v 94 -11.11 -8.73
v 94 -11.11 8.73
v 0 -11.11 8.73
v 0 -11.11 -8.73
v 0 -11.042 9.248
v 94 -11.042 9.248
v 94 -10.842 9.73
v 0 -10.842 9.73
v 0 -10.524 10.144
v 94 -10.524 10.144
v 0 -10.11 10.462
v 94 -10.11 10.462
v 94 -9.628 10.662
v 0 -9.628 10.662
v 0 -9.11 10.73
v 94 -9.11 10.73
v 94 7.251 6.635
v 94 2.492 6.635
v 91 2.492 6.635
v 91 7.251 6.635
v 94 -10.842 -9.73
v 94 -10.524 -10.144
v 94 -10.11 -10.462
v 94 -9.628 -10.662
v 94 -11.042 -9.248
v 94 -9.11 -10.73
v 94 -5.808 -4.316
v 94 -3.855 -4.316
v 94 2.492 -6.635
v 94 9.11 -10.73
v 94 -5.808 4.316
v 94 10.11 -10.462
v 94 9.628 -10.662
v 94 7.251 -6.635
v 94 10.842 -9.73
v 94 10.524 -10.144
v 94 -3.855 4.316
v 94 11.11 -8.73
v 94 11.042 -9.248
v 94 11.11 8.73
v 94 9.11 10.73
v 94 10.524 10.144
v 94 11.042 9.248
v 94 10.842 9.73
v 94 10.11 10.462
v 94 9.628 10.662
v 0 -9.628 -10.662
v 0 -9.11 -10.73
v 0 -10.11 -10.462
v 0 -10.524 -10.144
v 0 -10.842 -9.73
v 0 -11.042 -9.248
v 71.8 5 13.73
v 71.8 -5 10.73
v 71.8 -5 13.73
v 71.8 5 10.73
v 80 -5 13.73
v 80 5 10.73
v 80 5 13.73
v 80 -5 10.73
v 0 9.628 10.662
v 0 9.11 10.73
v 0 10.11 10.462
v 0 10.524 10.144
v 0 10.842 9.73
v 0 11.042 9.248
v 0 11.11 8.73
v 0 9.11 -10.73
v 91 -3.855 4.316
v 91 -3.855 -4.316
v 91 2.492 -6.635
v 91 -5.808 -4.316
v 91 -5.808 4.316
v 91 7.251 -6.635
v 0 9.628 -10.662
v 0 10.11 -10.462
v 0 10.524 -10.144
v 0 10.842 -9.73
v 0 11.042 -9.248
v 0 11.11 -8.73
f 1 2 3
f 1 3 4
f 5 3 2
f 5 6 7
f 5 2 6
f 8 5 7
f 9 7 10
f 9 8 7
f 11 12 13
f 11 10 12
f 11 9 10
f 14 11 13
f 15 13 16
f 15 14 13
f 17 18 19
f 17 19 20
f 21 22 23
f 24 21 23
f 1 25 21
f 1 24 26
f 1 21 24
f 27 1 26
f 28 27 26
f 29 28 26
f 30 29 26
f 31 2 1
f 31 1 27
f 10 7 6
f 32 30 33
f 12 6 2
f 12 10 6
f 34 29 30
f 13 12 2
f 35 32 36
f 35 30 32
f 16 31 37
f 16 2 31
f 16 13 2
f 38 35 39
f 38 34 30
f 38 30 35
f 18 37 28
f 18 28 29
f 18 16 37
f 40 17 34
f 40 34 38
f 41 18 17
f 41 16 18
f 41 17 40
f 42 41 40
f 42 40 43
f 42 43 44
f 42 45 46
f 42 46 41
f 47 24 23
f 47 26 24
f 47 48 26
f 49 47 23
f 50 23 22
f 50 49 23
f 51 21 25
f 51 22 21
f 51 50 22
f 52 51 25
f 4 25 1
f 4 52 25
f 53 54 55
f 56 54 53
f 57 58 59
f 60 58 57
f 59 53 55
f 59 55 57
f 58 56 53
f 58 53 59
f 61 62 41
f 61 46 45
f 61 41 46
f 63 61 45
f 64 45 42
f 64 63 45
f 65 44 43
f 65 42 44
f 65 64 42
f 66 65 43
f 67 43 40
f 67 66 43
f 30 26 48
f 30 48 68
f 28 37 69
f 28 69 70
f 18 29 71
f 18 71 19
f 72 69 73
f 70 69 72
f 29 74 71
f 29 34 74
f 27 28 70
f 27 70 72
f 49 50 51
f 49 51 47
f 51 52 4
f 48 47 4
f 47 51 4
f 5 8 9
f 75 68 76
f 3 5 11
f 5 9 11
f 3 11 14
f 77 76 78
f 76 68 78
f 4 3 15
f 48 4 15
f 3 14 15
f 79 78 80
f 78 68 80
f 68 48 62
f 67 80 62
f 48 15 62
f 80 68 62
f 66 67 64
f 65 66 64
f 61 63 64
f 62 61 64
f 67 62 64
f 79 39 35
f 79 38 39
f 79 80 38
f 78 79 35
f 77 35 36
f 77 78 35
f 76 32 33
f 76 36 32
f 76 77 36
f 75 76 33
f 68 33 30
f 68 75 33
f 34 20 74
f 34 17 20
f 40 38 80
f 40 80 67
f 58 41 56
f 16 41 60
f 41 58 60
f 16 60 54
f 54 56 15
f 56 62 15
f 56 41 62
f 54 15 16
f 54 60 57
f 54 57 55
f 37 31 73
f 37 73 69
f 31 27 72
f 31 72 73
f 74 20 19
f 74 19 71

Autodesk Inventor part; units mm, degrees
ref_plane "YZ Plane" through (0, 0, 0) normal (1, 0, 0) x (0, 1, 0)
ref_plane "XZ Plane" through (0, 0, 0) normal (0, 1, 0) x (-1, 0, 0)
ref_plane "XY Plane" through (0, 0, 0) normal (0, 0, 1) x (1, 0, 0)
sketch "Sketch1" plane through (0, 0, 0) normal (1, 0, 0) x (0, 1, 0)
  line L0 (-9.11, -10.73) -> (9.11, -10.73)
  line L1 (11.11, -8.73) -> (11.11, 8.73)
  line L2 (9.11, 10.73) -> (-9.11, 10.73)
  line L3 (-11.11, 8.73) -> (-11.11, -8.73)
  line L4 (-11.11, -10.73) -> (11.11, 10.73) construction
  line L5 (11.11, -10.73) -> (-11.11, 10.73) construction
  arc A0 (11.11, 8.73) -> (9.11, 10.73) centre (9.11, 8.73) ccw
  arc A1 (9.11, -10.73) -> (11.11, -8.73) centre (9.11, -8.73) ccw
  arc A2 (-11.11, -8.73) -> (-9.11, -10.73) centre (-9.11, -8.73) ccw
  arc A3 (-9.11, 10.73) -> (-11.11, 8.73) centre (-9.11, 8.73) ccw
  point P0 (0, 0)
  dimension "d0" = 22.22
  dimension "d1" = 21.46
  dimension "d2" = 2
extrude "Extrusion1" add sketch "Sketch1" along normal blind 94
sketch "Sketch2" plane through (94, 0, 0) normal (1, 0, 0) x (0, 0, -1)
  line L0 (-6.6347, 7.2513) -> (6.6347, 7.2513)
  line L1 (6.6347, 7.2513) -> (6.6347, 2.4915)
  line L2 (6.6347, 2.4915) -> (-6.6347, 2.4915)
  line L3 (-6.6347, 2.4915) -> (-6.6347, 7.2513)
  line L4 (-6.6347, 7.2513) -> (6.6347, 2.4915) construction
  line L5 (6.6347, 7.2513) -> (-6.6347, 2.4915) construction
  line L6 (-4.3158, -3.8551) -> (4.3158, -3.8551)
  line L7 (4.3158, -3.8551) -> (4.3158, -5.8078)
  line L8 (4.3158, -5.8078) -> (-4.3158, -5.8078)
  line L9 (-4.3158, -5.8078) -> (-4.3158, -3.8551)
  line L10 (-4.3158, -3.8551) -> (4.3158, -5.8078) construction
  line L11 (4.3158, -3.8551) -> (-4.3158, -5.8078) construction
  point P0 (0, 0)
  point P1 (0, 4.8714)
  point P2 (0, -4.8314)
extrude "Extrusion2" cut sketch "Sketch2" against normal blind 3
sketch "Sketch3" plane through (0, -9.11, 10.73) normal (0, 0, 1) x (1, 0, 0)
  line L0 (0, 18.22) -> (0, 0) projected
  line L1 (0, 0) -> (94, 0) projected
  line L2 (94, 18.22) -> (94, 0) projected
  line L3 (0, 18.22) -> (94, 18.22) projected
  line L4 (71.8, 14.11) -> (80, 14.11)
  line L5 (80, 14.11) -> (80, 4.11)
  line L6 (80, 4.11) -> (71.8, 4.11)
  line L7 (71.8, 4.11) -> (71.8, 14.11)
  line L8 (71.8, 14.11) -> (80, 4.11) construction
  line L9 (80, 14.11) -> (71.8, 4.11) construction
  point P0 (0, 9.11)
  point P1 (75.9, 9.11)
  dimension "d7" = 8.2
  dimension "d8" = 10
  dimension "d9" = 14
extrude "Extrusion3" add sketch "Sketch3" along normal blind 3 contours L4 L5 L6 L7
properties part number "00_Batterypack"
